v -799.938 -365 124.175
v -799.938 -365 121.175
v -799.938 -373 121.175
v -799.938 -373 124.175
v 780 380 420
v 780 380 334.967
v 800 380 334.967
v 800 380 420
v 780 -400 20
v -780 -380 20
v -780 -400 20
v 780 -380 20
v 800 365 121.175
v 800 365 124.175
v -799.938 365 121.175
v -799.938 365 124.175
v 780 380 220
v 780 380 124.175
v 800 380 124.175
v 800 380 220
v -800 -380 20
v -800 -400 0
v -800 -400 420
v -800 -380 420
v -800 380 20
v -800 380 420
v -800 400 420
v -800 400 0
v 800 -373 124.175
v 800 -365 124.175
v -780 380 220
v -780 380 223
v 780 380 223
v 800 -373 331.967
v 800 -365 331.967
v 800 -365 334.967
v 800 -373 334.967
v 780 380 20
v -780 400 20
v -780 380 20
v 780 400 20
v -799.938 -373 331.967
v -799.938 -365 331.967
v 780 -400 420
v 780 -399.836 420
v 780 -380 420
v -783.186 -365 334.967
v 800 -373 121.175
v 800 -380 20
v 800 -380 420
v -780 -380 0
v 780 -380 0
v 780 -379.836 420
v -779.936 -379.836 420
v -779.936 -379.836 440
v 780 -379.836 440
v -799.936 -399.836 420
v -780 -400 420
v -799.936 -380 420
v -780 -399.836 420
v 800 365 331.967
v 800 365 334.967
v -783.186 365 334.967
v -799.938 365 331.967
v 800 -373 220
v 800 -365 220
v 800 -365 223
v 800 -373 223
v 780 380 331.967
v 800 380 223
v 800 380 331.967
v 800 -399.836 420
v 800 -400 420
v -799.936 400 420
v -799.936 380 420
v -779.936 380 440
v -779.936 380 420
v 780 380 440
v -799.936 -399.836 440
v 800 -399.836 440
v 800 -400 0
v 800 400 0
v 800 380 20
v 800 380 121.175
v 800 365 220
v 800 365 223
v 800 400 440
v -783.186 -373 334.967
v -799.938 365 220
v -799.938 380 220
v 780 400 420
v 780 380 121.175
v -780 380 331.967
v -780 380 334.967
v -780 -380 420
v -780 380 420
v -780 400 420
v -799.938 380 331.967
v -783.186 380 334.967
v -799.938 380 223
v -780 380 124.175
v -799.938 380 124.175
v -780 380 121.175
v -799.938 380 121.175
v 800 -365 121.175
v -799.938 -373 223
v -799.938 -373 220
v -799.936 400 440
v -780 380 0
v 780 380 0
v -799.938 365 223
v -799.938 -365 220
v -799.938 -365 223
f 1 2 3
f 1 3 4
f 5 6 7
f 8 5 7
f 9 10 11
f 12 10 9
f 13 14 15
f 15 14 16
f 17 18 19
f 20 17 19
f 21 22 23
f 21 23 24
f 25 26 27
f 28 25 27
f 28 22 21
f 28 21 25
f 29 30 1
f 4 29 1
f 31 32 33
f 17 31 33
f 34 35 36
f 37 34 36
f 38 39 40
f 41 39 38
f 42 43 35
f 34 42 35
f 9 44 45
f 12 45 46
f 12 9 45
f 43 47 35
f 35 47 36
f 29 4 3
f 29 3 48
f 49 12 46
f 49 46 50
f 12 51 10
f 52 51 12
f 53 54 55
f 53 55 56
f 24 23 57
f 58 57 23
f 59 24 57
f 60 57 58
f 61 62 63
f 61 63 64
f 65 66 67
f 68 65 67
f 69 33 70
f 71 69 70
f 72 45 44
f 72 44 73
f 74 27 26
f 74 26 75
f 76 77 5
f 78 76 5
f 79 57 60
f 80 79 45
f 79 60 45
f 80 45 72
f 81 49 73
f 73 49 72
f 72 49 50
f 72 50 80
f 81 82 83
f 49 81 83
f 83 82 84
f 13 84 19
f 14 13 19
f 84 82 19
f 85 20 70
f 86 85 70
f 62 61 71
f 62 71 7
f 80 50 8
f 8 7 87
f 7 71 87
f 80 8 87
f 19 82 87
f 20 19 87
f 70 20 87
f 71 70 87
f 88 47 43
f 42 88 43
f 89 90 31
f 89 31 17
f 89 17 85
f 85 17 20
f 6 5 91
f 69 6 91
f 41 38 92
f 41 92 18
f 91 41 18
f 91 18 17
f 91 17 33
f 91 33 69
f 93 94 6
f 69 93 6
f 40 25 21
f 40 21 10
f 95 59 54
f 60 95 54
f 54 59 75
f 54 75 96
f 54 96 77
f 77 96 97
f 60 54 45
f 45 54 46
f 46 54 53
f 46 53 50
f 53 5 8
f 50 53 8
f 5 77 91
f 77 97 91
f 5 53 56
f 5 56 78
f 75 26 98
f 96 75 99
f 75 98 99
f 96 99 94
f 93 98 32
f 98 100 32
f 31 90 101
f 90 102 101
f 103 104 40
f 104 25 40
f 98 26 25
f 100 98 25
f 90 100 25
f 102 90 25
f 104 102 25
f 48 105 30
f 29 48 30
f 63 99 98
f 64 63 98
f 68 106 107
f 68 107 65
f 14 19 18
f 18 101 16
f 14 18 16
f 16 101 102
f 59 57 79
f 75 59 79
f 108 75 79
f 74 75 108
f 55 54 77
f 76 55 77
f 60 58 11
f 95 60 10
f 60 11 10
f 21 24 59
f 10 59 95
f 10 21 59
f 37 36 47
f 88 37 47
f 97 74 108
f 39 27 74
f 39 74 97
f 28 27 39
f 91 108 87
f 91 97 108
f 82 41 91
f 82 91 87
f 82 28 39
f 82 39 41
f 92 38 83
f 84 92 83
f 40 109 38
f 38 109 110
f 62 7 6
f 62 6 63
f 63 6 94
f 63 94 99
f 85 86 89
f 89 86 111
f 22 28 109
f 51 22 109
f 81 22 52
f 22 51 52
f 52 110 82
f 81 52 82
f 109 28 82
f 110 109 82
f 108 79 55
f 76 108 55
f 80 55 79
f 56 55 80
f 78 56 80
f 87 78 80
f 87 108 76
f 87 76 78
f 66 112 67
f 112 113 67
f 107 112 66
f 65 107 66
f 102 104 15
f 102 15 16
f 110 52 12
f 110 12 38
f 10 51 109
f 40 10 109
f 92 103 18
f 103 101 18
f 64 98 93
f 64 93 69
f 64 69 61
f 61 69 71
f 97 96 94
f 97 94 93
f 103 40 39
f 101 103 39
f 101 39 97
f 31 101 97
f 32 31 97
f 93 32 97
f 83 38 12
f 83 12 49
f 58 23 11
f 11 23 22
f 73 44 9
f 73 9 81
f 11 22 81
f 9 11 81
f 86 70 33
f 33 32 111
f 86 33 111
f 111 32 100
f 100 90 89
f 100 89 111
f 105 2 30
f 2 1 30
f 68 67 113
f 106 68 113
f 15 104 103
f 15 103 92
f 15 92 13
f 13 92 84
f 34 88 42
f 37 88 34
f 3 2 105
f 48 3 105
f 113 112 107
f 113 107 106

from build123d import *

# Parameters (mm, degrees)
F0_W      = 1600
F0_H      = 800
F0_W_2    = 1560
F0_H_2    = 760
F1_DEPTH  = 20
F2_W      = 20
F2_H      = 20
F3_DEPTH  = 400
F4_W      = 1599.9355792999
F4_H      = 799.8360455036
F4_W_2    = 1559.9355792999
F4_H_2    = 759.8360455036
F5_DEPTH  = 20
F6_W      = 20
F6_H      = 3
F6_W_2    = 1579.937575489
F7_DEPTH  = 753
F9_W      = 674.6543404628
F9_H      = 730
F9_W_2    = 1583.1864356995
F9_W_3    = 267.8158369829
F10_DEPTH = 245


with BuildPart() as f1:
    # F0 (on Top) → F1 (new body)
    with BuildSketch(Plane.XY):
        Rectangle(F0_W, F0_H)
        Rectangle(F0_W_2, F0_H_2, mode=Mode.SUBTRACT)
    extrude(amount=F1_DEPTH)

    # F2 (on face) → F3 (join)
    with BuildSketch(Plane.XY.offset(20)):
        with Locations((790, -390)):
            Rectangle(F2_W, F2_H)
        with Locations((790, 390)):
            Rectangle(F2_W, F2_H)
        with Locations((-790, 390)):
            Rectangle(F2_W, F2_H)
        with Locations((-790, -390)):
            Rectangle(F2_W, F2_H)
    extrude(amount=F3_DEPTH)

    # F4 (on face) → F5 (join)
    with BuildSketch(Plane.XY.offset(420)):
        with Locations((0.03221035, 0.0819772482)):
            Rectangle(F4_W, F4_H)
        with Locations((0.03221035, 0.0819772482)):
            Rectangle(F4_W_2, F4_H_2, mode=Mode.SUBTRACT)
    extrude(amount=F5_DEPTH)

    # F6 (on face) → F7 (join)
    with BuildSketch(Plane.XZ.offset(-380)):
        Polygon((-799.937575489, 331.9668085575), (780, 331.9668085575), (780, 334.9668085575), (-783.1864356995, 334.9668085575), align=None)
        with Locations((790, 333.4668085575)):
            Rectangle(F6_W, F6_H)
        with Locations((-9.9687877445, 221.5)):
            Rectangle(F6_W_2, F6_H)
        with Locations((790, 221.5)):
            Rectangle(F6_W, F6_H)
        with Locations((790, 122.6748781684)):
            Rectangle(F6_W, F6_H)
        with Locations((-9.9687877445, 122.6748781684)):
            Rectangle(F6_W_2, F6_H)
    extrude(amount=F7_DEPTH)

    # F9 (on face) → F10 (cut)
    with BuildSketch(Plane.XY.offset(334.9668085575)):
        with Locations((1137.3271702314, 0)):
            Rectangle(F9_W, F9_H)
        with Locations((8.4067821503, 0)):
            Rectangle(F9_W_2, F9_H)
        with Locations((-917.0943541909, 0)):
            Rectangle(F9_W_3, F9_H)
    extrude(amount=-F10_DEPTH, mode=Mode.SUBTRACT)


solid = f1.part
